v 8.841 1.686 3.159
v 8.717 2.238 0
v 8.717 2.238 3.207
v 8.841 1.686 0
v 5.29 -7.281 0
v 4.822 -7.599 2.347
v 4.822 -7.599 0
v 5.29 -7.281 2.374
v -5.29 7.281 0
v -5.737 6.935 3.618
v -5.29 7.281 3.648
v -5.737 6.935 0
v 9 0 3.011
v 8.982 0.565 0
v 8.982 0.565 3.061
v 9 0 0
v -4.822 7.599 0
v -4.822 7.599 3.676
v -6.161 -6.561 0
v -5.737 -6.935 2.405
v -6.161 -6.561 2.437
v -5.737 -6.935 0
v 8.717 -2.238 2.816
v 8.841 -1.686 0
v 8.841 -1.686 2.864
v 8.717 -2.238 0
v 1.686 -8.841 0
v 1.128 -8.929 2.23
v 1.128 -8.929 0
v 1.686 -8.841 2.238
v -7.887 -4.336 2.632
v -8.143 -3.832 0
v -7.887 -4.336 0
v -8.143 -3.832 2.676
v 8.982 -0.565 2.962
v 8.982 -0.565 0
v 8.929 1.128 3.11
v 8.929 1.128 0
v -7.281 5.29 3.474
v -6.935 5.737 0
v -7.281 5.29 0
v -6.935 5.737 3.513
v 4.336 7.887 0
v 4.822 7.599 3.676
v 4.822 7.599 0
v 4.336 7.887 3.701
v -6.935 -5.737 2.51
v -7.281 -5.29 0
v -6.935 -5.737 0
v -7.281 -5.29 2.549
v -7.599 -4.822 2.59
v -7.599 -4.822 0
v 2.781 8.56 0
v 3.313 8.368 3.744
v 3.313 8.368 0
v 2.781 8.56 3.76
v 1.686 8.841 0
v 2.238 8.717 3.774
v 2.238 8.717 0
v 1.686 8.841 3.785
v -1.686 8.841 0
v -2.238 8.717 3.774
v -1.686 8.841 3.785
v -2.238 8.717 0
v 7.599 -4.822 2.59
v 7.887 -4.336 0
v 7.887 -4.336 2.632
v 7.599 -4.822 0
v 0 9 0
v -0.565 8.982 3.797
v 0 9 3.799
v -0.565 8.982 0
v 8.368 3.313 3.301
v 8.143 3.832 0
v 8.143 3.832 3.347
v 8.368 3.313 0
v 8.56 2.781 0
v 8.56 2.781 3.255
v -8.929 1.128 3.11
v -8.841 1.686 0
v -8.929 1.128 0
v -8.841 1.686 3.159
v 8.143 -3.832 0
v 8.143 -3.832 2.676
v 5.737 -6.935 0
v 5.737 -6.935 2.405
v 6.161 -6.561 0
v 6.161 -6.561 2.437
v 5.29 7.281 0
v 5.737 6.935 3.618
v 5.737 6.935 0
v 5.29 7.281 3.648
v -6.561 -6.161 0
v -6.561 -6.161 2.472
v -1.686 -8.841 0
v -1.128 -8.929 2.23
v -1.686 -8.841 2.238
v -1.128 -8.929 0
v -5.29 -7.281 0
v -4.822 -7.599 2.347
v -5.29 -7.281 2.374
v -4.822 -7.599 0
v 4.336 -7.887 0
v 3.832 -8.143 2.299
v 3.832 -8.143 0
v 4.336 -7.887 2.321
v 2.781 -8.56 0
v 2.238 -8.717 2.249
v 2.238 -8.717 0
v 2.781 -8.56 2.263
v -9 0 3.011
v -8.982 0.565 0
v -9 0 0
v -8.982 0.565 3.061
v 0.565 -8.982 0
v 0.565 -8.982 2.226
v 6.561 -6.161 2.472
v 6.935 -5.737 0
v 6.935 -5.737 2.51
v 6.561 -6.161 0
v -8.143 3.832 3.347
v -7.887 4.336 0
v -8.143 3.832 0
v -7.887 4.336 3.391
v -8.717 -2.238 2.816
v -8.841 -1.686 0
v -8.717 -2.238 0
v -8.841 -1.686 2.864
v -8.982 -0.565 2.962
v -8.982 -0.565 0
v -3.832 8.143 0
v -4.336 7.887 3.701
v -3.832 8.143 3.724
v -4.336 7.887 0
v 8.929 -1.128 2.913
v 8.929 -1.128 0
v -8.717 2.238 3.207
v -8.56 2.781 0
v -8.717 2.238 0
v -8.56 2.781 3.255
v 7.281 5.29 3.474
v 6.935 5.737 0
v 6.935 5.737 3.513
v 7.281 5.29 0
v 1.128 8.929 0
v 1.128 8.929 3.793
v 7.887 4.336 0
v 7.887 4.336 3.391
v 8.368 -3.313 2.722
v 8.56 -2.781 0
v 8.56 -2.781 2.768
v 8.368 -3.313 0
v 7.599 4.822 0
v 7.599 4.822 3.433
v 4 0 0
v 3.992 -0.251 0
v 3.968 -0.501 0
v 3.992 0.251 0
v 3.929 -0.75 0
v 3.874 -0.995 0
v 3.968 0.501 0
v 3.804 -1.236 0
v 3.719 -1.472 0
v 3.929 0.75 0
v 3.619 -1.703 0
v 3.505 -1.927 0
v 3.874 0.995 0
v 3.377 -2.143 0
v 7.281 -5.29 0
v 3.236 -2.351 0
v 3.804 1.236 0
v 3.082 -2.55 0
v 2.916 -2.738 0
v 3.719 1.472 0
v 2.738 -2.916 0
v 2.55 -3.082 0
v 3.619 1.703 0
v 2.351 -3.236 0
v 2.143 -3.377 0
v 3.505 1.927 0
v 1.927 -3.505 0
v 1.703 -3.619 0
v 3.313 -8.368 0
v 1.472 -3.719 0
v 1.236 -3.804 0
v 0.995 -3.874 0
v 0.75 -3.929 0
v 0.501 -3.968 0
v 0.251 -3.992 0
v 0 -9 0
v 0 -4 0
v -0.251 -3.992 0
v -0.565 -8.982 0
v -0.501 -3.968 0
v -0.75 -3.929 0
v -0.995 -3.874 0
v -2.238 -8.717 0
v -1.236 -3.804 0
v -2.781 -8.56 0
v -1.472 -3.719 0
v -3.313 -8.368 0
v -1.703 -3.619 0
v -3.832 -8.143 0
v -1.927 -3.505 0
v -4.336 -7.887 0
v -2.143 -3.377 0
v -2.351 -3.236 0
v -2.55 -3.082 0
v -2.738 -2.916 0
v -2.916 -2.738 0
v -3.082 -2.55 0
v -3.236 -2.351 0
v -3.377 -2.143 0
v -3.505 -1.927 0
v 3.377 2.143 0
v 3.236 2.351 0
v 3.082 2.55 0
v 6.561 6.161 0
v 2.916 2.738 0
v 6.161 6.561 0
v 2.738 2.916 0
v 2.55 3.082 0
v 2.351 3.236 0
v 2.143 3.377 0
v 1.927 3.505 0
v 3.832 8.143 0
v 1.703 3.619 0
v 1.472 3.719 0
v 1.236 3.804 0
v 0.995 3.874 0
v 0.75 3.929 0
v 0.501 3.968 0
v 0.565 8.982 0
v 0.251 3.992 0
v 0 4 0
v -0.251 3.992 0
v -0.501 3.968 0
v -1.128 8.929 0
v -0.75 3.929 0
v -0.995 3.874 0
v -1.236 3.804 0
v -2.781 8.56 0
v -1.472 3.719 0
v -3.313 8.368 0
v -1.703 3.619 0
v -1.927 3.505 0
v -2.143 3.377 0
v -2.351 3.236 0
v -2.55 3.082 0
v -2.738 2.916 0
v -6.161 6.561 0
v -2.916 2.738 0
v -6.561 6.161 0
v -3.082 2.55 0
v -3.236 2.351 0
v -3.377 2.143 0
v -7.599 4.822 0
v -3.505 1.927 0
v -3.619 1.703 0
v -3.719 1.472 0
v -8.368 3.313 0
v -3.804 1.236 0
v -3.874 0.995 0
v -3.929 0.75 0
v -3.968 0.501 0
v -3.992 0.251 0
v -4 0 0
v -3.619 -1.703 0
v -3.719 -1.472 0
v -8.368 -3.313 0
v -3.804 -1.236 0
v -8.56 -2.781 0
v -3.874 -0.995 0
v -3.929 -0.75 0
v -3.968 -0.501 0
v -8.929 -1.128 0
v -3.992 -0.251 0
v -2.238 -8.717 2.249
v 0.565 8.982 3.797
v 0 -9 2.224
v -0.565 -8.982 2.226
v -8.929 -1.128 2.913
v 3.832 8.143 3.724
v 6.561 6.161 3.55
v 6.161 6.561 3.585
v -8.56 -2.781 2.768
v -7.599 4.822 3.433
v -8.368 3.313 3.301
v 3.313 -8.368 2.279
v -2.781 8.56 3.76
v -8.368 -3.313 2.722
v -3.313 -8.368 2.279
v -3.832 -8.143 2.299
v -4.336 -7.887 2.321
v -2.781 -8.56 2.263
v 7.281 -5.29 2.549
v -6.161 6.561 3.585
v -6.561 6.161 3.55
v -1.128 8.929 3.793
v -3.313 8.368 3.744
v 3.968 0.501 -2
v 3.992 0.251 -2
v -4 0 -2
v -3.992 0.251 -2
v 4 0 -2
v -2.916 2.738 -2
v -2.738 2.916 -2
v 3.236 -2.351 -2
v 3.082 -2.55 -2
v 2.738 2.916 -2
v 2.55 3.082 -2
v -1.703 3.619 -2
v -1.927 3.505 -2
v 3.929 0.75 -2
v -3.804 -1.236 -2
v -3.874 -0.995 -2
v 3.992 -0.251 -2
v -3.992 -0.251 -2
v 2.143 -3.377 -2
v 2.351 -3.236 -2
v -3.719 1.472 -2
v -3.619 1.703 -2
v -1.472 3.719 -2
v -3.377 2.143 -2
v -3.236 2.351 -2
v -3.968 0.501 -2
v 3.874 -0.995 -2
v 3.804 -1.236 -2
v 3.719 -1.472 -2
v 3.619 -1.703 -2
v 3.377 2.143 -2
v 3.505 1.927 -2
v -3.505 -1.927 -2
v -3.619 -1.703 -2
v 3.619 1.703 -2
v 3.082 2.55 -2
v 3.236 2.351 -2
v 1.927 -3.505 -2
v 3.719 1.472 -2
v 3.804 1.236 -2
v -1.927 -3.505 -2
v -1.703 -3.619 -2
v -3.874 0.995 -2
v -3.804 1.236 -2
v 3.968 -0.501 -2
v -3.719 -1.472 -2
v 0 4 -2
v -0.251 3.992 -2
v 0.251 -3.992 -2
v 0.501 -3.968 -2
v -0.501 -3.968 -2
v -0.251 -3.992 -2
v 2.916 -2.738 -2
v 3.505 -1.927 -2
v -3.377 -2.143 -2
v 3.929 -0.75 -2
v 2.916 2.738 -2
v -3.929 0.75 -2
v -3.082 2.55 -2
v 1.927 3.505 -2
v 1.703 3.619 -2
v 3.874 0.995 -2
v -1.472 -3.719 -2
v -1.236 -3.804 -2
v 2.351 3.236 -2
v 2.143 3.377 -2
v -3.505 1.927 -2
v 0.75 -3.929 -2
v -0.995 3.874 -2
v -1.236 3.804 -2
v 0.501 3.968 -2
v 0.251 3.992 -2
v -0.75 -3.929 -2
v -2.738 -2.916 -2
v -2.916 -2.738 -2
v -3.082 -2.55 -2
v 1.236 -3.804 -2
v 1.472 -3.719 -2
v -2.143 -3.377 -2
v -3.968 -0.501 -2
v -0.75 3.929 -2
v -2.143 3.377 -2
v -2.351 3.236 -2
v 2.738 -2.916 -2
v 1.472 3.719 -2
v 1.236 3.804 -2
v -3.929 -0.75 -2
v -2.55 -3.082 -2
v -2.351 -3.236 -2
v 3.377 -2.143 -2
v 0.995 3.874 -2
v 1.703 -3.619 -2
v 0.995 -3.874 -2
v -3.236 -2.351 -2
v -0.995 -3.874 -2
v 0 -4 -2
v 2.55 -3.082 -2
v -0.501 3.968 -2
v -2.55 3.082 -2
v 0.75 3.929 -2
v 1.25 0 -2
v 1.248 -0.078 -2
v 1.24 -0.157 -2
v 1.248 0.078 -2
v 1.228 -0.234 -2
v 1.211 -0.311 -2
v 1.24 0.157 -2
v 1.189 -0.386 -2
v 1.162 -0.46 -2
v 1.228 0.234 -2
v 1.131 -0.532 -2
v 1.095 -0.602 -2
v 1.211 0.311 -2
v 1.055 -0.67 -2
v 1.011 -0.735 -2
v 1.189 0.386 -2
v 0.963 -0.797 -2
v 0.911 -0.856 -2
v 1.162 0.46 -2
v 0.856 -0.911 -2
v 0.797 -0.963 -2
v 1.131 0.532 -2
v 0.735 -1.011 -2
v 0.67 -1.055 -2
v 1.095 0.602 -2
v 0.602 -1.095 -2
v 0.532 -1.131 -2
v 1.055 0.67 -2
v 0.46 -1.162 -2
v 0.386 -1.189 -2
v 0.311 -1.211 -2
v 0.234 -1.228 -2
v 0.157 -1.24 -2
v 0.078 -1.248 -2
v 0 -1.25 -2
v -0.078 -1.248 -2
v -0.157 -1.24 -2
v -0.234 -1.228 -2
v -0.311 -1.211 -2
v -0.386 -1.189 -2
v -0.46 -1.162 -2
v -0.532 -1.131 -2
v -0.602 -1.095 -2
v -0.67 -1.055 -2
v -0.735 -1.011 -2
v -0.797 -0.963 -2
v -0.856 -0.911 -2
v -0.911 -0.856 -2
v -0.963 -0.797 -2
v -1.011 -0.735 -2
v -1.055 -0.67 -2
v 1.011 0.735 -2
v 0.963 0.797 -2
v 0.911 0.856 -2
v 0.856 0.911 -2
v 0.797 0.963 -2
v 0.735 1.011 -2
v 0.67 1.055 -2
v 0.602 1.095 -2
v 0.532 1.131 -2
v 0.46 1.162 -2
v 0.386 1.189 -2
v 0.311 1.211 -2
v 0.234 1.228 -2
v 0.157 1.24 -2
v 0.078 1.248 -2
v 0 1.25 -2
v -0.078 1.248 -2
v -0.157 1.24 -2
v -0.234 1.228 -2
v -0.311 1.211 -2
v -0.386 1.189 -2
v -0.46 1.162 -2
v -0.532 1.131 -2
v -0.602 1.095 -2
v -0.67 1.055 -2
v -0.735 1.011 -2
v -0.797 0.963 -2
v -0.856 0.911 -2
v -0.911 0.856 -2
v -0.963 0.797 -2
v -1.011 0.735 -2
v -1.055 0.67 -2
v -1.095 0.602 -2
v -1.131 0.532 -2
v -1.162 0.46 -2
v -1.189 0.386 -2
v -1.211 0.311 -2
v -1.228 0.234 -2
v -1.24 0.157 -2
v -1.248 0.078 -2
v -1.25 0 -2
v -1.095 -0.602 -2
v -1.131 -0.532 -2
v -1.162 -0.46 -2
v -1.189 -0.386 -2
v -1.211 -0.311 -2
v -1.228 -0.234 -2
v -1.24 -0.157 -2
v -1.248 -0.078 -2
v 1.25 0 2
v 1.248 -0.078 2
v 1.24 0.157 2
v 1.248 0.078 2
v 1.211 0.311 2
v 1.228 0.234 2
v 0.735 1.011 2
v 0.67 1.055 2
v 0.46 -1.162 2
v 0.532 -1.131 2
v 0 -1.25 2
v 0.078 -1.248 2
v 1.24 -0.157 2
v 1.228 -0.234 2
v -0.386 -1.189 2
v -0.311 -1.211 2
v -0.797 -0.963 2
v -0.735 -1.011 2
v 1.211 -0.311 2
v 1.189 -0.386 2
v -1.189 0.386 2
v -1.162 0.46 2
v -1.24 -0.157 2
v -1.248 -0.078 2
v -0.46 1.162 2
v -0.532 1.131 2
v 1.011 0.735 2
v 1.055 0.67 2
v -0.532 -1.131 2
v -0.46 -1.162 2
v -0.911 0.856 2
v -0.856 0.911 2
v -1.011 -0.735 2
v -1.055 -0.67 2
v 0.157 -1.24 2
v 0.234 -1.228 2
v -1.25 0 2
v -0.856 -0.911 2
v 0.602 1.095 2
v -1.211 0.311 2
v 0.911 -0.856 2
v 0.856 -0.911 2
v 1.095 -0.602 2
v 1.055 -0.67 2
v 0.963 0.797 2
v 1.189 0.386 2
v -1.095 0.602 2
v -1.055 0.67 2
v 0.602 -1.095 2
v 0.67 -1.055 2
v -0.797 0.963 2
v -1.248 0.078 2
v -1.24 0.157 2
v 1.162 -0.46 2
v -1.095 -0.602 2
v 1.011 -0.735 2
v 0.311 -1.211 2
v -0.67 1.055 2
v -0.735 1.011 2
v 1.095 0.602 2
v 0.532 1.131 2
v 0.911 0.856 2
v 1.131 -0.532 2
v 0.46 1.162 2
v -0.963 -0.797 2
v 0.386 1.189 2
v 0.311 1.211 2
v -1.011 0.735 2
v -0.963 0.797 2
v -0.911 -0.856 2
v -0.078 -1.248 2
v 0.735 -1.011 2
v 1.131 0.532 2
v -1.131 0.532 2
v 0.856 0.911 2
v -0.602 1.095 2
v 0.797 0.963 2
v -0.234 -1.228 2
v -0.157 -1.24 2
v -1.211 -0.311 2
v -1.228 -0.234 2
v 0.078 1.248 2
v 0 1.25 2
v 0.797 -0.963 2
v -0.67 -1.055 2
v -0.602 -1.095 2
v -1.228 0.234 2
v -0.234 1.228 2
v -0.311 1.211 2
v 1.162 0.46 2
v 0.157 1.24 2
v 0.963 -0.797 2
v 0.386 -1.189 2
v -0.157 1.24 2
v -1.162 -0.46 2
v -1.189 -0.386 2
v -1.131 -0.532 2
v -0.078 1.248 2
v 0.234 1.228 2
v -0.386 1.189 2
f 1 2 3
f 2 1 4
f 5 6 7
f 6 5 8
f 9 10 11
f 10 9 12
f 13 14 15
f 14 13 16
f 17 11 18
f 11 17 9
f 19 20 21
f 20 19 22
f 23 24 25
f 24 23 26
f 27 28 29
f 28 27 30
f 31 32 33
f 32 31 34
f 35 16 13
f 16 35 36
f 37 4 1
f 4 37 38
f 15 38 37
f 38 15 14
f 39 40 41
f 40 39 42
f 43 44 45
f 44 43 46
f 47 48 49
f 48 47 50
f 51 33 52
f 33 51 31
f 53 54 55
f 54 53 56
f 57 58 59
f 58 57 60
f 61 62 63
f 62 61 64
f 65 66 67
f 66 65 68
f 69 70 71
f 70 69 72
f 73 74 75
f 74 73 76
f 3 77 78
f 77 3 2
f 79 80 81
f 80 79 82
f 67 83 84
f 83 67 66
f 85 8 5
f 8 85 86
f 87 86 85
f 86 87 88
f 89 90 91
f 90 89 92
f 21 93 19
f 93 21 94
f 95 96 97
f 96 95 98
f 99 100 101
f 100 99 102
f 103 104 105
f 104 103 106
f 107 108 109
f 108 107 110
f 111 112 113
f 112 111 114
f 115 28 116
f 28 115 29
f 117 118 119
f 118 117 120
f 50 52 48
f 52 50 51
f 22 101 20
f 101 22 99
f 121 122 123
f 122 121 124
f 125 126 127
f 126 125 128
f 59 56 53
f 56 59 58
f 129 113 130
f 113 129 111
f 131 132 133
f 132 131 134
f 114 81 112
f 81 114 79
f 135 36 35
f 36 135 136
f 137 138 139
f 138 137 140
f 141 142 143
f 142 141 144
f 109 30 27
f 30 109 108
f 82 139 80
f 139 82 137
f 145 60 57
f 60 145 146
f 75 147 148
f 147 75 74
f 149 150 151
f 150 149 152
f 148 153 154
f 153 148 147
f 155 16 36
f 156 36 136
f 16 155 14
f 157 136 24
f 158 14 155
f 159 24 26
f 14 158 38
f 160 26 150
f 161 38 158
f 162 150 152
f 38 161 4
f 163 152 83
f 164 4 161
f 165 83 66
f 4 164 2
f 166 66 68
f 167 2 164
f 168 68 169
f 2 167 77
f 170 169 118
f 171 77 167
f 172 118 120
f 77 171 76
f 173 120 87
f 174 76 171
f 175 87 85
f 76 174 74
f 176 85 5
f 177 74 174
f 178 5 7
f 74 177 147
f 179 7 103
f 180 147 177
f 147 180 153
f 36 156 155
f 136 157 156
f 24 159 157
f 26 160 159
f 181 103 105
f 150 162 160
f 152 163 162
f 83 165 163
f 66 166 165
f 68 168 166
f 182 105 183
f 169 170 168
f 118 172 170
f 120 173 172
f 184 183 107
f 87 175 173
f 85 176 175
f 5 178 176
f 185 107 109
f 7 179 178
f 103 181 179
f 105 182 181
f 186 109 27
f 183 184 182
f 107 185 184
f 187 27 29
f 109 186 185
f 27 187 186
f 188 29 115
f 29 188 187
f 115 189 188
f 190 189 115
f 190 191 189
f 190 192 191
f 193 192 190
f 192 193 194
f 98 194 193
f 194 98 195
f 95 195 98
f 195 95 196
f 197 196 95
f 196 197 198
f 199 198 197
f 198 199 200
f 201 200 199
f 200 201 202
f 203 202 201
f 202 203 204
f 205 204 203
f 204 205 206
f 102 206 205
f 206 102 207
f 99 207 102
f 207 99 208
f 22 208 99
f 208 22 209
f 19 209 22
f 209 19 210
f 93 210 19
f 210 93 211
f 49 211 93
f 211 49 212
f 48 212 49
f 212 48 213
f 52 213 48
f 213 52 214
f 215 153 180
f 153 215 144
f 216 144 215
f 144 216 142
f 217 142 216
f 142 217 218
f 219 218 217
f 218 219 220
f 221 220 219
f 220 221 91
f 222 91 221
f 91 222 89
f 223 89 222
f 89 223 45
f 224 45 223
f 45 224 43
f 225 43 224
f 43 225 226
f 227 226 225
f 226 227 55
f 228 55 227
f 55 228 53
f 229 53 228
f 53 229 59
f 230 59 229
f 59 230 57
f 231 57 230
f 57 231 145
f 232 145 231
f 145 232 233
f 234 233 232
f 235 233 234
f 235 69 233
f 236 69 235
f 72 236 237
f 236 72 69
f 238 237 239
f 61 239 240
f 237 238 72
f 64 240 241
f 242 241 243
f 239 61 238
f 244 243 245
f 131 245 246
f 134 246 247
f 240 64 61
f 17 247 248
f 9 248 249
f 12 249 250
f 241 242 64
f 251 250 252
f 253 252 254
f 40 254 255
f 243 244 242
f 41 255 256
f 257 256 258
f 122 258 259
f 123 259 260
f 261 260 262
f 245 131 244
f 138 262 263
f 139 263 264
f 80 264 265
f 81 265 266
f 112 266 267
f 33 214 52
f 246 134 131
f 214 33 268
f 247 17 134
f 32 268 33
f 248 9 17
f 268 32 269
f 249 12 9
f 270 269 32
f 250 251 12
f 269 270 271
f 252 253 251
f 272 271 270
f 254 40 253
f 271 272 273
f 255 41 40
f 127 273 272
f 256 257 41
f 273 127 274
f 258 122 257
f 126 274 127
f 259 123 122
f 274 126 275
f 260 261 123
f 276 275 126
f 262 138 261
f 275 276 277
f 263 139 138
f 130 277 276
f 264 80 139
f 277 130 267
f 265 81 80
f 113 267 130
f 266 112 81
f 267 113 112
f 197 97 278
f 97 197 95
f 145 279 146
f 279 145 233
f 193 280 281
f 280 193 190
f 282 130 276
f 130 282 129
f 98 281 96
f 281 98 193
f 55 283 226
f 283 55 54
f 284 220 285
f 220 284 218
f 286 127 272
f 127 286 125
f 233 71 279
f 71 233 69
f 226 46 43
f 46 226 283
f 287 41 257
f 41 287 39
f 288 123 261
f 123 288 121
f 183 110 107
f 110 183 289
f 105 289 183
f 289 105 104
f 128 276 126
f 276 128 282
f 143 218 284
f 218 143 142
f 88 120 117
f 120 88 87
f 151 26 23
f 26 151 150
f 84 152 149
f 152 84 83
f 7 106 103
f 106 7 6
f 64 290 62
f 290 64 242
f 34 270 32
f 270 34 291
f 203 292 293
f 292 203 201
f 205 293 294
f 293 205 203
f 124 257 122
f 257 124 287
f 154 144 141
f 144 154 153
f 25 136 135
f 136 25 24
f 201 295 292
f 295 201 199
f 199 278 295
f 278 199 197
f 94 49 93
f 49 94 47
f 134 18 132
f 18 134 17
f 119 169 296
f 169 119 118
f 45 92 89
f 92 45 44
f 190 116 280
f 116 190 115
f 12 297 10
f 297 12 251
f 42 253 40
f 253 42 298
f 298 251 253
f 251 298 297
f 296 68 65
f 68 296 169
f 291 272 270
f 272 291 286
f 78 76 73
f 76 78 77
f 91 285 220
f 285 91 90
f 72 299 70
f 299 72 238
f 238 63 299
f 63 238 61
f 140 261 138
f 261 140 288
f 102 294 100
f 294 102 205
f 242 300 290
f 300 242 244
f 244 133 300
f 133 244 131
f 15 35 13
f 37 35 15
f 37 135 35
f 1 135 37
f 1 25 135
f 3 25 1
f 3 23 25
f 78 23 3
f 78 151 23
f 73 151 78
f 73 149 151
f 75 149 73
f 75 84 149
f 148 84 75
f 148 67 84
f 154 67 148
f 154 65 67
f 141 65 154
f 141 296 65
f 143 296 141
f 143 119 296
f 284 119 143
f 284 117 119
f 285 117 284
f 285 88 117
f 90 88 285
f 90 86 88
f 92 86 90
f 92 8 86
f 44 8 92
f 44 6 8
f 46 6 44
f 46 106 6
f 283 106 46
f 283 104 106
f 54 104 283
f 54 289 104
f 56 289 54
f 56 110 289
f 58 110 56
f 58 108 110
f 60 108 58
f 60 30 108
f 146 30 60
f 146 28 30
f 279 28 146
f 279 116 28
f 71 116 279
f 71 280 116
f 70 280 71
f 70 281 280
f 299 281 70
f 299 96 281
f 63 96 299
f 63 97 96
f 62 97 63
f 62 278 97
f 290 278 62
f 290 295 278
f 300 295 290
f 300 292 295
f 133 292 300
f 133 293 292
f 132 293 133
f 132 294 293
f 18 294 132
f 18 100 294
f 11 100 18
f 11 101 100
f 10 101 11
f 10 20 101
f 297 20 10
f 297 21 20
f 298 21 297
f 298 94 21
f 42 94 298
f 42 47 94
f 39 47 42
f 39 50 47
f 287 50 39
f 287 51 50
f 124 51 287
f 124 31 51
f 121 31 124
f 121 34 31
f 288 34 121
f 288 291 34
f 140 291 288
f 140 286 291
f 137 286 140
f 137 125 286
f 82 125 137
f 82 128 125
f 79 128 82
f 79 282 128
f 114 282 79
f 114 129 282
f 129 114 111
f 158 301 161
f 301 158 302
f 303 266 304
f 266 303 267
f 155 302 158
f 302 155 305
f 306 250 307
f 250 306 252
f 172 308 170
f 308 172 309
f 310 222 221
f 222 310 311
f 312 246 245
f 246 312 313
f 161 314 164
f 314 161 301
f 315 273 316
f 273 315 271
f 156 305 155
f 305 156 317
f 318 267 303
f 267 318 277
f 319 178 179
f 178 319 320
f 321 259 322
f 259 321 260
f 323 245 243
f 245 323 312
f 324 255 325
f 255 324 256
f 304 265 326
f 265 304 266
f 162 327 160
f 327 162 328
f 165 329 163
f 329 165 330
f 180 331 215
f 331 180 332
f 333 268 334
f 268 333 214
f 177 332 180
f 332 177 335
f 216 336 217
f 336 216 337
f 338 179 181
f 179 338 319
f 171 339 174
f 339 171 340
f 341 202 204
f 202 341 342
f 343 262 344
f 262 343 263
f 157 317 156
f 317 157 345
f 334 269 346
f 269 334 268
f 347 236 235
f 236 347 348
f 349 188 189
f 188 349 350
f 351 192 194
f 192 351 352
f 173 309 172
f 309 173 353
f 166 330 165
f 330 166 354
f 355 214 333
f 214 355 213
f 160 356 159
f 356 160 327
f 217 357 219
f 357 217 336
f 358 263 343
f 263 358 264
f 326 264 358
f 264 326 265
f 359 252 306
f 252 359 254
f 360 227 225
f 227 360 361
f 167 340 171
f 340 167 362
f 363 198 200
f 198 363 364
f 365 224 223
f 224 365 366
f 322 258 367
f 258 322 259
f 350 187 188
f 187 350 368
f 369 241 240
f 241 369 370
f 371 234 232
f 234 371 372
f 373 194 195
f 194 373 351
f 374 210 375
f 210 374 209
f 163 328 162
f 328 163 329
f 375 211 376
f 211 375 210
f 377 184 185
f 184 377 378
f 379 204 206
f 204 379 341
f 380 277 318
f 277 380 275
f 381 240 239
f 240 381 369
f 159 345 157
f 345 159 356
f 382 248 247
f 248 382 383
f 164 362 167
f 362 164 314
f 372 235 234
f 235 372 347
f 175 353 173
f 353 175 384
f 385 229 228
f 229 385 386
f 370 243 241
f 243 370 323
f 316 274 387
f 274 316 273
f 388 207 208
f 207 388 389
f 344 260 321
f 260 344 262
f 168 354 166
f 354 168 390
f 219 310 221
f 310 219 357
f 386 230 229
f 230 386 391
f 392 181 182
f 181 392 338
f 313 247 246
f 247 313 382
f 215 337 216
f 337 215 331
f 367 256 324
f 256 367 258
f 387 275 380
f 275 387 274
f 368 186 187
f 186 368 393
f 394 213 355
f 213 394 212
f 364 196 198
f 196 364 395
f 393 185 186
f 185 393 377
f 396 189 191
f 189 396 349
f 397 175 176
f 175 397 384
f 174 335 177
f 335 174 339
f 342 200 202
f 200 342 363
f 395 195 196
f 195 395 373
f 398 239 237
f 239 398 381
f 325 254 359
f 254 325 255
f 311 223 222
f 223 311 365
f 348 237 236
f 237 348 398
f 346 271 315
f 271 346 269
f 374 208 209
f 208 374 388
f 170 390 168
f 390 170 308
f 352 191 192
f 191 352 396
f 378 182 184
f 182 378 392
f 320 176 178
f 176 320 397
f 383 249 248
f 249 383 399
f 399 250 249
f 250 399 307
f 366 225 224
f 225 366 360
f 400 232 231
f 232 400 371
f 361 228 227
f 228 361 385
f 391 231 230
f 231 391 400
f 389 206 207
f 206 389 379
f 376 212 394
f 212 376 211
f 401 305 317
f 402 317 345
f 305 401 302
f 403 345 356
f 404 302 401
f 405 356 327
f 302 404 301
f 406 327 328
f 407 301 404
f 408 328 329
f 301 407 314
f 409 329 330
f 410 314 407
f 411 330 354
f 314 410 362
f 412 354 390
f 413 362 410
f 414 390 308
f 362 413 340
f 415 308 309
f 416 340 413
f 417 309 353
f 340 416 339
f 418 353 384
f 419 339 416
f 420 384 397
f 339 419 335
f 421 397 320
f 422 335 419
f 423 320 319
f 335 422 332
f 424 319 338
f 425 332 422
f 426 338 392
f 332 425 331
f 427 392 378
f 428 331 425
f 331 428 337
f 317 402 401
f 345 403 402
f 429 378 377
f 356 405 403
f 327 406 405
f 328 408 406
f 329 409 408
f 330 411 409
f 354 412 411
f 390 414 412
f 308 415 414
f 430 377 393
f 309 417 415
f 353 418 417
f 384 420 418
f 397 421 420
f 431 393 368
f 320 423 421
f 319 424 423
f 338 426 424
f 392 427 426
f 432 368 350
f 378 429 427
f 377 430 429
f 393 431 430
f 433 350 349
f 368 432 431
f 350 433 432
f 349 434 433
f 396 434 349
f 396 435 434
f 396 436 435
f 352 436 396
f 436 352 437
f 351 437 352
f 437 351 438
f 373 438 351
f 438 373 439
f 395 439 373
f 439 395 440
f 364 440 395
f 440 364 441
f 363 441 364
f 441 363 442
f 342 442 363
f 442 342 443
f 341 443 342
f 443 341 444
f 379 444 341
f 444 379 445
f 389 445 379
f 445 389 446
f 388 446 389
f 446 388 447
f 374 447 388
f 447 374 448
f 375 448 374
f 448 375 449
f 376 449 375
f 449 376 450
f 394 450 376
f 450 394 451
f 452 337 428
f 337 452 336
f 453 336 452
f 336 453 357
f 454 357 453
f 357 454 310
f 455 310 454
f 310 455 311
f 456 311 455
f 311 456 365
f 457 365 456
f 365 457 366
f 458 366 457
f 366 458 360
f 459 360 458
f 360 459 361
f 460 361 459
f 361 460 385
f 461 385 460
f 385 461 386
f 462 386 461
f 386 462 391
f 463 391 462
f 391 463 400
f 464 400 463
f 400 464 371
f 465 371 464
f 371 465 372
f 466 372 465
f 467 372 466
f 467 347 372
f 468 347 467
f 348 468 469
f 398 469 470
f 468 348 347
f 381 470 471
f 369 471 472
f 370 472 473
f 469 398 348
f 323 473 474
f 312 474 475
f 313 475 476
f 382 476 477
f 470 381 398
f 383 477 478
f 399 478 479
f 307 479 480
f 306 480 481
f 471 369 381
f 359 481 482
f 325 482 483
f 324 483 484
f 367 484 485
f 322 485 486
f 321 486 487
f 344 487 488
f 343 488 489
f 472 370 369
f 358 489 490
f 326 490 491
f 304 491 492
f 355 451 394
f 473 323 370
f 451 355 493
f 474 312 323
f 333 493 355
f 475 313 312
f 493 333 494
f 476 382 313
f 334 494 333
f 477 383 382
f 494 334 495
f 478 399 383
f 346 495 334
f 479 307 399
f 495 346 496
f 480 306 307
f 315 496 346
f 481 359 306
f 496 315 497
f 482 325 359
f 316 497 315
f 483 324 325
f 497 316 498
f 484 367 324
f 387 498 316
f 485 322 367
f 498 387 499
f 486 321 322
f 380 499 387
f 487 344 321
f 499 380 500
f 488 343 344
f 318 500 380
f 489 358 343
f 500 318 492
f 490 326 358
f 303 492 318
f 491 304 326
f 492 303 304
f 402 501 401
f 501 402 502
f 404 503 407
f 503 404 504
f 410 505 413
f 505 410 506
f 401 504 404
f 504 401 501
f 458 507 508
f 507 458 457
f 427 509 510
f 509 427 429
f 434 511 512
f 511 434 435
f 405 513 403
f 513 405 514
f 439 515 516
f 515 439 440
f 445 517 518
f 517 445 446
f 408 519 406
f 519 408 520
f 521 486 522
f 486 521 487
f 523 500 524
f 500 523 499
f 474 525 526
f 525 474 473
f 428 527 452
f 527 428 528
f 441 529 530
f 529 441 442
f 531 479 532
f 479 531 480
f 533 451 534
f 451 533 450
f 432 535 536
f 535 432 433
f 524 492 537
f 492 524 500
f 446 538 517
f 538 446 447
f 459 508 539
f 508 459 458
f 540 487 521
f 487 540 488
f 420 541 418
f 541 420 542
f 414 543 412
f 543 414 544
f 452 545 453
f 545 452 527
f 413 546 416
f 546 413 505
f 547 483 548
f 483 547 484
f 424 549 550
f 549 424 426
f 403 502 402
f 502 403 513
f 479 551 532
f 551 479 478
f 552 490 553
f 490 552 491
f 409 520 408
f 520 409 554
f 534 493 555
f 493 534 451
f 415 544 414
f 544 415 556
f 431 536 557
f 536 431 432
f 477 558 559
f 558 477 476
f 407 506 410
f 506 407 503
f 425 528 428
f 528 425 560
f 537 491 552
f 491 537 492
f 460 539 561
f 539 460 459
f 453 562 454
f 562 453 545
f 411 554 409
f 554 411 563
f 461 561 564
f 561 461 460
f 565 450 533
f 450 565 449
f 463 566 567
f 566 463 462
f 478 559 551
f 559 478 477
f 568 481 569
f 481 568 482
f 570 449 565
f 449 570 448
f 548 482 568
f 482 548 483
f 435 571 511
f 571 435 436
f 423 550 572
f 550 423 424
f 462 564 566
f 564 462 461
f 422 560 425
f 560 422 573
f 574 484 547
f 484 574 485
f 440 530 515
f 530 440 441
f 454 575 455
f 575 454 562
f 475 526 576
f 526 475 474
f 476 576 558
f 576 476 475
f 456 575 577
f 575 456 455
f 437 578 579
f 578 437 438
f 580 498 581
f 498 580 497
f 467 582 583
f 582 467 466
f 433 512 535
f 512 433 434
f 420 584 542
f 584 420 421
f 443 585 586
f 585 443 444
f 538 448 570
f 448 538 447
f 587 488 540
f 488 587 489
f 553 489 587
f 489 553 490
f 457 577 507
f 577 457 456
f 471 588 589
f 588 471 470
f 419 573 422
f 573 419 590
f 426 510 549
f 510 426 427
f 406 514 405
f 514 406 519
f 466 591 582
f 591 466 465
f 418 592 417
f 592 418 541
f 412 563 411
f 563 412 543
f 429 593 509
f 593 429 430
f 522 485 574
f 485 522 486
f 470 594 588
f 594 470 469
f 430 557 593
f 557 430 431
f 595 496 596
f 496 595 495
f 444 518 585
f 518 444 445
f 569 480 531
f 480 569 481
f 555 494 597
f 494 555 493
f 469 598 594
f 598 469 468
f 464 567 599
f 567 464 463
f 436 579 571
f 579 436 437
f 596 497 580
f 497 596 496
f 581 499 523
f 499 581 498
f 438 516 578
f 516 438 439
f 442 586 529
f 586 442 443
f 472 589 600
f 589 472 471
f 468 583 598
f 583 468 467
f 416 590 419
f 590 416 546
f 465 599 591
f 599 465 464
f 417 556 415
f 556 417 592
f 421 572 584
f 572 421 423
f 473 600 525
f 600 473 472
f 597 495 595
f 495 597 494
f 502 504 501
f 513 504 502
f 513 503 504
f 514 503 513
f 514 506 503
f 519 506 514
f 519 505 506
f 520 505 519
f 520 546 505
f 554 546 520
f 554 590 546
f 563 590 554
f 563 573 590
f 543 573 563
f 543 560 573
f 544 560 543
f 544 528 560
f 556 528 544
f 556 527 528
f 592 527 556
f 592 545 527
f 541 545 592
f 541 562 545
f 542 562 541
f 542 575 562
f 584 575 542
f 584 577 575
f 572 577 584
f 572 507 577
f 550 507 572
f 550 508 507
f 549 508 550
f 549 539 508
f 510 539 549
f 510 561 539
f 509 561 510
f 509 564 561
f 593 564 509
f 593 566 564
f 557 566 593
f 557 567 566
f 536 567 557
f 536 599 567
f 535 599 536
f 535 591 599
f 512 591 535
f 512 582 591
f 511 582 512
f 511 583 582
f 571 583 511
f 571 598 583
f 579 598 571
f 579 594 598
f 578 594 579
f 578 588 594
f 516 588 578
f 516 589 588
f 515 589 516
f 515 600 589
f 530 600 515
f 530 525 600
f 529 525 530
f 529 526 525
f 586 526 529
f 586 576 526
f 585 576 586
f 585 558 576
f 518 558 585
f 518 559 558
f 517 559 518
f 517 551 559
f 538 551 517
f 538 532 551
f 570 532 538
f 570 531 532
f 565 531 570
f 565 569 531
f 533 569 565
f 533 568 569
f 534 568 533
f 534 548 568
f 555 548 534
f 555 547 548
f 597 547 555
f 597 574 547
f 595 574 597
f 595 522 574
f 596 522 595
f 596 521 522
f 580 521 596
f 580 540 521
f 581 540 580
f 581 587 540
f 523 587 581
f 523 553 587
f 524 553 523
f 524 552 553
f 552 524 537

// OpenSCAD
/*

    motor_flange2.scad

    
    Flange for motor used in laser audio project. The top of the cylinder is tilted and that's the surface to stick the mirror onto.
    
    
    Author: Mahesh Venkitachalam (electronut.in)
*/

// set smoothness
$fn=100;

// tilt angle 
a = 5;

// top cylinder module 
module top_cyl(a = 5, r = 9, h = 20, t = 3) {
// mirror support
difference() {
    // top cylinder 
    linear_extrude(h) {
        circle(r);
    }

    // cutting solid 
    rotate(a, [1, 0, 0]) {
        translate([-h, -h, t]) {
            linear_extrude(h) {
                square(2*h);
            }
        }
    }
}
}

// bottom cylinder with hole 
module bot_cyl(r = 4, h = 4) {
difference() {
    // shaft support
    translate([0, 0, -2]) {
        linear_extrude(h) {
            circle(r);
        }
    }   
}
}

module hole(r = 1.25) {
    // shaft hole
    translate([0, 0, -8]) {
        #linear_extrude(10) {
            circle(r);  
        }
    }   
}

difference() {
union() {
    #top_cyl(a = 5, r = 9, h = 20, t = 3);
    bot_cyl();
}

hole();

}
